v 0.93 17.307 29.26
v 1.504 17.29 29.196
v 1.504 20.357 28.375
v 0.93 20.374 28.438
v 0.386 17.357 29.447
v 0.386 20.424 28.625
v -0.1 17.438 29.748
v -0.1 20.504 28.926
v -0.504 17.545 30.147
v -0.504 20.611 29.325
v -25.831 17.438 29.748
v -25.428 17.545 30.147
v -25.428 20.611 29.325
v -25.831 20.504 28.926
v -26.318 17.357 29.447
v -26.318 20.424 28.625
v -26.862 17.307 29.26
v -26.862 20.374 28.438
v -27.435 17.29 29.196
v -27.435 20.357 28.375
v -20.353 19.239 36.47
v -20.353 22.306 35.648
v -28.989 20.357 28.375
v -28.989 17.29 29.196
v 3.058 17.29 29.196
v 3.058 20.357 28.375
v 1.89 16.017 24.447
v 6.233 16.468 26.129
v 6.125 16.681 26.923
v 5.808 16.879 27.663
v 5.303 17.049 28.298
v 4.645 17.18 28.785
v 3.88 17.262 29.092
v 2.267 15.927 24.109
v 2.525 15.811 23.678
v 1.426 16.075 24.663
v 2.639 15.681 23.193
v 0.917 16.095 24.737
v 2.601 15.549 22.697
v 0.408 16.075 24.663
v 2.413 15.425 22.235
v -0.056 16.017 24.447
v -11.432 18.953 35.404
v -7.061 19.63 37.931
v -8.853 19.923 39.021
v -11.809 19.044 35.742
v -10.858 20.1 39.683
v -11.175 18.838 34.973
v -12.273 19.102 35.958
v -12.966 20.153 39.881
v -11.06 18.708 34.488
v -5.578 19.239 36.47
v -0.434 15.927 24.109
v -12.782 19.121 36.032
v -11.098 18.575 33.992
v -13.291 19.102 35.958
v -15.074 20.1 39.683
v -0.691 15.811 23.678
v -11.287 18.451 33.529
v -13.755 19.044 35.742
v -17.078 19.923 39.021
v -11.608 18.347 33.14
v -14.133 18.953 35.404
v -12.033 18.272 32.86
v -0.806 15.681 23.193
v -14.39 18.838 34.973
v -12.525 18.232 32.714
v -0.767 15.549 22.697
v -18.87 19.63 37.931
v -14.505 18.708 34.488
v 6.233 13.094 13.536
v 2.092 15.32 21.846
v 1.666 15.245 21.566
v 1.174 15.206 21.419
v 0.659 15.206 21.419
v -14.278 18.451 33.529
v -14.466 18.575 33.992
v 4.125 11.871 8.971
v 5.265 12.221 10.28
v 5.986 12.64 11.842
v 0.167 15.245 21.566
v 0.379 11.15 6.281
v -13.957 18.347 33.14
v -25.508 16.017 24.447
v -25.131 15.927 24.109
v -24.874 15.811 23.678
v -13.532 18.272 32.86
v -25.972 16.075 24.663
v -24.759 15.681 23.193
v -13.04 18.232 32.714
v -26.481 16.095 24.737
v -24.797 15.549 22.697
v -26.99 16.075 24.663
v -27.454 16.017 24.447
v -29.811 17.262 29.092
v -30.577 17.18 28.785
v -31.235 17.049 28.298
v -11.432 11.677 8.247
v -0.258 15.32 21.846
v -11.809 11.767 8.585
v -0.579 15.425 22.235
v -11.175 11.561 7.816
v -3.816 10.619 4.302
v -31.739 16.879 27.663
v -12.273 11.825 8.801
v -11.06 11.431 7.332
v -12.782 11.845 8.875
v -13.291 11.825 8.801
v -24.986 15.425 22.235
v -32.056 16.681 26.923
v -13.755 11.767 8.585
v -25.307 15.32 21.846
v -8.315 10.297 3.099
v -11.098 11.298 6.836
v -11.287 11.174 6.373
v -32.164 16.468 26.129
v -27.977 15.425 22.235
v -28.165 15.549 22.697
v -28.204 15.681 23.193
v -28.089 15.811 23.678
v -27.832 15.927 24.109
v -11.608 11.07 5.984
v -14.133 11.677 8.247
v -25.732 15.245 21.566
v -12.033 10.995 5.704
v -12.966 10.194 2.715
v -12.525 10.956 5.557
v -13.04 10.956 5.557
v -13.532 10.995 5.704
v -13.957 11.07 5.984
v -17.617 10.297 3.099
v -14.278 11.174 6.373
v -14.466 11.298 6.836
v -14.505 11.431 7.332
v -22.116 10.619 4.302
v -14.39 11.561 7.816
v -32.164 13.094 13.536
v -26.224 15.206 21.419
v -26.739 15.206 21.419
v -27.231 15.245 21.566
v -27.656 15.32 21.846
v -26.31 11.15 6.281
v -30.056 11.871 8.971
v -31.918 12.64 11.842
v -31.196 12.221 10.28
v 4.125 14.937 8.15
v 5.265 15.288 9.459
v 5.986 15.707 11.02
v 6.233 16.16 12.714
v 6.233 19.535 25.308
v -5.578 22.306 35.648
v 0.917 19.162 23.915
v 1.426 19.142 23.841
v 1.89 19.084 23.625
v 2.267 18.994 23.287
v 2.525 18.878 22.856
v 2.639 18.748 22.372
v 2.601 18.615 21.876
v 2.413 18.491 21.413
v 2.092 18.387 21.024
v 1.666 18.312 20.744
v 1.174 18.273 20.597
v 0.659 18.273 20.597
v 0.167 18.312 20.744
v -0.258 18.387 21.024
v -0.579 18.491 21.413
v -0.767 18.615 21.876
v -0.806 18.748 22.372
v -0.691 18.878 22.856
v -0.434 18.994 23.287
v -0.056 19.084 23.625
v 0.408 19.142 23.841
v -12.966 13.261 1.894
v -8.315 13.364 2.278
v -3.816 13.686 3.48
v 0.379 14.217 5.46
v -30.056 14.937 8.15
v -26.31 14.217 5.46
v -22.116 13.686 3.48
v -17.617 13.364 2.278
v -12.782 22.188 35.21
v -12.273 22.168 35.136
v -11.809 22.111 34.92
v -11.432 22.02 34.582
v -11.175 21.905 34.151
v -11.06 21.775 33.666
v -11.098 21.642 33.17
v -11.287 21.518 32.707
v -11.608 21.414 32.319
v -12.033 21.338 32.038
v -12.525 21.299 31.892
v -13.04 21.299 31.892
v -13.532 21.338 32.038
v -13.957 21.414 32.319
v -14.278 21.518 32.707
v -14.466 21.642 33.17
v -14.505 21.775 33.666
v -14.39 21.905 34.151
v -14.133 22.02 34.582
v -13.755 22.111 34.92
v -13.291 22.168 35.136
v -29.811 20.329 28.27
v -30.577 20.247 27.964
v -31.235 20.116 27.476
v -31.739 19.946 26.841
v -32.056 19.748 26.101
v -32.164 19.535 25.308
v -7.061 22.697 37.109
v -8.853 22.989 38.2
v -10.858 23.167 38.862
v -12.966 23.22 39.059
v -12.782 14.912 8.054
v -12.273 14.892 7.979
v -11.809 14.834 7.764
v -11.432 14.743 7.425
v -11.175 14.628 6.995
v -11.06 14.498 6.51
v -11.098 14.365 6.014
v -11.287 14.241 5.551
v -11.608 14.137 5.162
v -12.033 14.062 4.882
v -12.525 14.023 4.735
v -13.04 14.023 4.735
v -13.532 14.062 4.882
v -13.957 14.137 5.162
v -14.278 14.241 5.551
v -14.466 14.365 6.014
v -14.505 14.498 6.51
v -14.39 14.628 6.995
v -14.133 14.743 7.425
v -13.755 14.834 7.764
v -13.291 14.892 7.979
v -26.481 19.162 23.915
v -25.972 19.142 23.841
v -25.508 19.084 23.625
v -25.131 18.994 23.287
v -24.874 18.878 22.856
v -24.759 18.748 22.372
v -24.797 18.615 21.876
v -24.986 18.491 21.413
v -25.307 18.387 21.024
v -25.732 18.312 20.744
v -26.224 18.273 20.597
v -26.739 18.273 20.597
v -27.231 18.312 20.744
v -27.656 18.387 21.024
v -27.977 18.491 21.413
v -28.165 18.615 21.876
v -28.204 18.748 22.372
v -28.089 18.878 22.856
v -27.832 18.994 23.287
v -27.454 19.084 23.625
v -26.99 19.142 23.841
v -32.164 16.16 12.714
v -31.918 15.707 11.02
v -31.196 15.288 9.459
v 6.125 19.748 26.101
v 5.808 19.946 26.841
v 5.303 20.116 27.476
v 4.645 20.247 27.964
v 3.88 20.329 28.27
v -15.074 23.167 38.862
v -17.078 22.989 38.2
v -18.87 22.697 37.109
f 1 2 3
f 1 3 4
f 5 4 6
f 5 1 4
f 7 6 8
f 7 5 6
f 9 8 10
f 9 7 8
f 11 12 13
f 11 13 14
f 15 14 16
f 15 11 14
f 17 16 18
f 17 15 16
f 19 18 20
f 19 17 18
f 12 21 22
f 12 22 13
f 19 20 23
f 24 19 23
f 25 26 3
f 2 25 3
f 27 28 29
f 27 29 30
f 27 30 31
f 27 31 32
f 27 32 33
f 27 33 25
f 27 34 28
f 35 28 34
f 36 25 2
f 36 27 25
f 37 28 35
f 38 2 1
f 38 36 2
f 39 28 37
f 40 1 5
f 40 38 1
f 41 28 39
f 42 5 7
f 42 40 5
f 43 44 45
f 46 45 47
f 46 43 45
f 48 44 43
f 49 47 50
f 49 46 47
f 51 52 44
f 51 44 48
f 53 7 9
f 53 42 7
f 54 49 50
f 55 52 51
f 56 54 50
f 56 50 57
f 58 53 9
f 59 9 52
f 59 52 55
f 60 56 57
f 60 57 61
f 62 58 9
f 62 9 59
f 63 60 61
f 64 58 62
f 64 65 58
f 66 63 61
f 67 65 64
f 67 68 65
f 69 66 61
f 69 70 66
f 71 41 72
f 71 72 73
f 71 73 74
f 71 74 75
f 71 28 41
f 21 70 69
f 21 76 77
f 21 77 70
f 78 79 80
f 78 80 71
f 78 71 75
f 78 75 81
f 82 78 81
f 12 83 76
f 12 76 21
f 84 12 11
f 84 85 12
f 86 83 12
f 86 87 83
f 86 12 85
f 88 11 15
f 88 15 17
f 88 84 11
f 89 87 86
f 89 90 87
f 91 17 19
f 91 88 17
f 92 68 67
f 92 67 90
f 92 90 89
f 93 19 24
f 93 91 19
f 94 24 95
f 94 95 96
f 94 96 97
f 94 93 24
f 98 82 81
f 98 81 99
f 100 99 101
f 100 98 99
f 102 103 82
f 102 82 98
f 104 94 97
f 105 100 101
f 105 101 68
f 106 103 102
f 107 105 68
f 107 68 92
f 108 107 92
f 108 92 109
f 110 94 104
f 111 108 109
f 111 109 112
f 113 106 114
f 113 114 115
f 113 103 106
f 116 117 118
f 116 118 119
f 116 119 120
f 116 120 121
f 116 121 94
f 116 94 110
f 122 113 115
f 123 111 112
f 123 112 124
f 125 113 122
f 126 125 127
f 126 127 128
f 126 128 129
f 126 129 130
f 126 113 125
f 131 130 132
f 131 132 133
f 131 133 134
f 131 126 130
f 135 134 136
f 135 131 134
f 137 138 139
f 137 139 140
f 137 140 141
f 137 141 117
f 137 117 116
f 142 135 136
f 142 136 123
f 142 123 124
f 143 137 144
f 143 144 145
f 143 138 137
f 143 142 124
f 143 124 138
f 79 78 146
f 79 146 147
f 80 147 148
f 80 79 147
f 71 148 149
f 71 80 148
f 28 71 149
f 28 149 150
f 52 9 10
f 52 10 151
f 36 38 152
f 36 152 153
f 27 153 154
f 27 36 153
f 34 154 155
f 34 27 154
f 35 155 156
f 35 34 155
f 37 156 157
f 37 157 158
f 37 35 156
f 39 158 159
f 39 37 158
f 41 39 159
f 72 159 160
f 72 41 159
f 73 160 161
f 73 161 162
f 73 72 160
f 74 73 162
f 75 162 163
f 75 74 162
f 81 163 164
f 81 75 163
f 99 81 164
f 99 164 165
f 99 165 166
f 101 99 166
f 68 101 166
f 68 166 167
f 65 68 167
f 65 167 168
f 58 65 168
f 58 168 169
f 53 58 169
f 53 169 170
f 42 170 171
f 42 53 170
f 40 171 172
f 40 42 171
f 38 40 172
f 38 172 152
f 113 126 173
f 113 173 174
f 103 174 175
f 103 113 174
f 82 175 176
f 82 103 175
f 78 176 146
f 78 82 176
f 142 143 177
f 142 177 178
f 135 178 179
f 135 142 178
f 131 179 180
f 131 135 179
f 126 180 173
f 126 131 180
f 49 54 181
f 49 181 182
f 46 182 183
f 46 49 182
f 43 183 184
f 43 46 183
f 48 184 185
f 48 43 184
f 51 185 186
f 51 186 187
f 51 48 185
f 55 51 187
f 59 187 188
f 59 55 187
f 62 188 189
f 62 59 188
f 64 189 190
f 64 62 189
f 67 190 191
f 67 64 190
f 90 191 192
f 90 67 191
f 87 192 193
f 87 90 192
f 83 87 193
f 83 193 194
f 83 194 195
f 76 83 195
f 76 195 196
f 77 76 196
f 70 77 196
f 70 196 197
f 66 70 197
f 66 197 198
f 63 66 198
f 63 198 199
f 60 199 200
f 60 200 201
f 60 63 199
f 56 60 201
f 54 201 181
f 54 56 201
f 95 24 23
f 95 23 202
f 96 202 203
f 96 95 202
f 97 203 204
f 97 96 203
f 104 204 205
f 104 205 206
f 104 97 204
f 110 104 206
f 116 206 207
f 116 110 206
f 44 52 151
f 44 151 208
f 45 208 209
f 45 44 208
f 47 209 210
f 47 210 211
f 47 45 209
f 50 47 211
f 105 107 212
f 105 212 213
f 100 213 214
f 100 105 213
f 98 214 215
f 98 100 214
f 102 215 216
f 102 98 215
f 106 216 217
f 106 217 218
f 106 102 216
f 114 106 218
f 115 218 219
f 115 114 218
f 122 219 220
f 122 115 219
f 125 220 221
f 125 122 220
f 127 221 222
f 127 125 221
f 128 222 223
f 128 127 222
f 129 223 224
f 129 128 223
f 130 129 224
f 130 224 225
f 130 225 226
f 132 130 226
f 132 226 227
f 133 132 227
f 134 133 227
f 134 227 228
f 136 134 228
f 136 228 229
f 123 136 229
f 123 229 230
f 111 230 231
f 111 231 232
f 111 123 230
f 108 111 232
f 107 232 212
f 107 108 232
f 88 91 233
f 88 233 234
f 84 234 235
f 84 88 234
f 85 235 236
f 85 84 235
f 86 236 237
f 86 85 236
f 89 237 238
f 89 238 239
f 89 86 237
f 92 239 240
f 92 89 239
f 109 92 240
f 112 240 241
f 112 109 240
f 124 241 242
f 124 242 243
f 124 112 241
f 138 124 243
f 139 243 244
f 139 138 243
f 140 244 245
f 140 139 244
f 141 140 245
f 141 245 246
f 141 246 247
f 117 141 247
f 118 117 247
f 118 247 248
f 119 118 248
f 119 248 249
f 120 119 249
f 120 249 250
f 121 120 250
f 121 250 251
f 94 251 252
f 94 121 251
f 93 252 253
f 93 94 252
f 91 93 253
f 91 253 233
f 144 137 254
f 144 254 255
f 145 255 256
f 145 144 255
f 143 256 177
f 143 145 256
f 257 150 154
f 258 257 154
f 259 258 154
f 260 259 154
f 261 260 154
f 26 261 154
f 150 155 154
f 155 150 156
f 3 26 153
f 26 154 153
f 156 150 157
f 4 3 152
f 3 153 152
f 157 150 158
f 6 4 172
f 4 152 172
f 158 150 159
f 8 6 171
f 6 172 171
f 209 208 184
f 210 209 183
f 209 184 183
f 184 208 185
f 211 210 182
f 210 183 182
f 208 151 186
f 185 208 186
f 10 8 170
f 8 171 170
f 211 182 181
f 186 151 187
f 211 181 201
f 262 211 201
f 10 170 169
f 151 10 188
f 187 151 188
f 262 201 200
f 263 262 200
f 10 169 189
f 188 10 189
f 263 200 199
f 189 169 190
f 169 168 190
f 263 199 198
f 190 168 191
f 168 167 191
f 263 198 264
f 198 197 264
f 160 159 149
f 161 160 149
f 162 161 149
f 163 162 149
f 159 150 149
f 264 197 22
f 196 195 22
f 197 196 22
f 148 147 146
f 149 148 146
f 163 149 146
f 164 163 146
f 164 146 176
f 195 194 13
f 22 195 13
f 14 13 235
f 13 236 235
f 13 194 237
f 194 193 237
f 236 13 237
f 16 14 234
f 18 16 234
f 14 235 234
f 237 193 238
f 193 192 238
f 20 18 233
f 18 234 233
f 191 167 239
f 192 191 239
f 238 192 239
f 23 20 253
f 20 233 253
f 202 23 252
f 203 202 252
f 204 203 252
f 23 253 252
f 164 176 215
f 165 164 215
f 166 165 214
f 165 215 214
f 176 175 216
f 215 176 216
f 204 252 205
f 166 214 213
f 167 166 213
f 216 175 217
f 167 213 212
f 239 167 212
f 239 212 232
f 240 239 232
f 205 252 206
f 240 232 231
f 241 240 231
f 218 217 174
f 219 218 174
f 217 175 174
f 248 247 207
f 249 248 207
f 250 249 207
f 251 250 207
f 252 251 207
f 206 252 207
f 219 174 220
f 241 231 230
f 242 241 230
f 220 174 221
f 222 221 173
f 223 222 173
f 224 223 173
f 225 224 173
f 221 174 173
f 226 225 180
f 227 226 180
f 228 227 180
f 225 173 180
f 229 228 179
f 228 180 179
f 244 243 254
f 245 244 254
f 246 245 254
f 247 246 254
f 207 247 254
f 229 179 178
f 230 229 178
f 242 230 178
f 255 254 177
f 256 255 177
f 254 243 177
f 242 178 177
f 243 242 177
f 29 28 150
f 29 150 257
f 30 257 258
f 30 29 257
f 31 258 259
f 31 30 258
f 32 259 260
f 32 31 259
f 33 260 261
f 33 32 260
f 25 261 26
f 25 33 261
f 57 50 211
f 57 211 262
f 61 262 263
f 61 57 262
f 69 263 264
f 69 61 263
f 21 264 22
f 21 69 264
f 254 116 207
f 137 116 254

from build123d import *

# Parameters (mm, degrees)
SKETCH1_R      = 1.7272
EXTRUDE1_DEPTH = 3.175


with BuildPart() as part:
    # Sketch1 → Extrude1 (new body)
    with BuildSketch(Plane(origin=(0, 8.832630516, -2.366696214), x_dir=(1, 0, 0), z_dir=(0, 0.9659258262890681, -0.25881904510252135))):
        with BuildLine():
            Line((6.232958536, -16.463411329), (6.232958536, -29.501422299))
            ThreePointArc((6.232958536, -29.501422299), (5.303022566, -31.746486329), (3.057958536, -32.676422299))
            Line((3.057958536, -32.676422299), (1.503815544, -32.676422299))
            ThreePointArc((1.503815544, -32.676422299), (0.385985087, -32.93562089), (-0.503703576, -33.660315947))
            Line((-0.503703576, -33.660315947), (-5.578238388, -40.206928682))
            ThreePointArc((-5.578238388, -40.206928682), (-8.853459375, -42.848154666), (-12.965757523, -43.738183401))
            ThreePointArc((-12.965757523, -43.738183401), (-17.07805567, -42.848154665), (-20.353276656, -40.206928682))
            Line((-20.353276656, -40.206928682), (-25.427811468, -33.660315947))
            ThreePointArc((-25.427811468, -33.660315947), (-26.317500131, -32.93562089), (-27.435330589, -32.676422299))
            Line((-27.435330589, -32.676422299), (-28.98947358, -32.676422299))
            ThreePointArc((-28.98947358, -32.676422299), (-31.234537611, -31.746486329), (-32.16447358, -29.501422299))
            Line((-32.16447358, -29.501422299), (-32.16447358, -16.463411329))
            ThreePointArc((-32.16447358, -16.463411329), (-31.6135685, -13.876328394), (-30.056442678, -11.738139043))
            ThreePointArc((-30.056442678, -11.738139043), (-22.115977586, -6.903610393), (-12.965757522, -5.261317506))
            ThreePointArc((-12.965757522, -5.261317506), (-3.815537458, -6.903610394), (4.124927634, -11.738139043))
            ThreePointArc((4.124927634, -11.738139043), (5.682053455, -13.876328394), (6.232958536, -16.463411329))
        make_face()
        with Locations(Location((0.916706492, -26.332658417, 0), (0, 0, 270))):
            Circle(SKETCH1_R, mode=Mode.SUBTRACT)
        with Locations(Location((-12.782344336, -38.025699687, 0), (0, 0, 270))):
            Circle(SKETCH1_R, mode=Mode.SUBTRACT)
        with Locations(Location((-26.481395164, -26.332658417, 0), (0, 0, 270))):
            Circle(SKETCH1_R, mode=Mode.SUBTRACT)
        with Locations(Location((-12.782344336, -9.91136031, 0), (0, 0, 270))):
            Circle(SKETCH1_R, mode=Mode.SUBTRACT)
    extrude(amount=EXTRUDE1_DEPTH)


solid = part.part
